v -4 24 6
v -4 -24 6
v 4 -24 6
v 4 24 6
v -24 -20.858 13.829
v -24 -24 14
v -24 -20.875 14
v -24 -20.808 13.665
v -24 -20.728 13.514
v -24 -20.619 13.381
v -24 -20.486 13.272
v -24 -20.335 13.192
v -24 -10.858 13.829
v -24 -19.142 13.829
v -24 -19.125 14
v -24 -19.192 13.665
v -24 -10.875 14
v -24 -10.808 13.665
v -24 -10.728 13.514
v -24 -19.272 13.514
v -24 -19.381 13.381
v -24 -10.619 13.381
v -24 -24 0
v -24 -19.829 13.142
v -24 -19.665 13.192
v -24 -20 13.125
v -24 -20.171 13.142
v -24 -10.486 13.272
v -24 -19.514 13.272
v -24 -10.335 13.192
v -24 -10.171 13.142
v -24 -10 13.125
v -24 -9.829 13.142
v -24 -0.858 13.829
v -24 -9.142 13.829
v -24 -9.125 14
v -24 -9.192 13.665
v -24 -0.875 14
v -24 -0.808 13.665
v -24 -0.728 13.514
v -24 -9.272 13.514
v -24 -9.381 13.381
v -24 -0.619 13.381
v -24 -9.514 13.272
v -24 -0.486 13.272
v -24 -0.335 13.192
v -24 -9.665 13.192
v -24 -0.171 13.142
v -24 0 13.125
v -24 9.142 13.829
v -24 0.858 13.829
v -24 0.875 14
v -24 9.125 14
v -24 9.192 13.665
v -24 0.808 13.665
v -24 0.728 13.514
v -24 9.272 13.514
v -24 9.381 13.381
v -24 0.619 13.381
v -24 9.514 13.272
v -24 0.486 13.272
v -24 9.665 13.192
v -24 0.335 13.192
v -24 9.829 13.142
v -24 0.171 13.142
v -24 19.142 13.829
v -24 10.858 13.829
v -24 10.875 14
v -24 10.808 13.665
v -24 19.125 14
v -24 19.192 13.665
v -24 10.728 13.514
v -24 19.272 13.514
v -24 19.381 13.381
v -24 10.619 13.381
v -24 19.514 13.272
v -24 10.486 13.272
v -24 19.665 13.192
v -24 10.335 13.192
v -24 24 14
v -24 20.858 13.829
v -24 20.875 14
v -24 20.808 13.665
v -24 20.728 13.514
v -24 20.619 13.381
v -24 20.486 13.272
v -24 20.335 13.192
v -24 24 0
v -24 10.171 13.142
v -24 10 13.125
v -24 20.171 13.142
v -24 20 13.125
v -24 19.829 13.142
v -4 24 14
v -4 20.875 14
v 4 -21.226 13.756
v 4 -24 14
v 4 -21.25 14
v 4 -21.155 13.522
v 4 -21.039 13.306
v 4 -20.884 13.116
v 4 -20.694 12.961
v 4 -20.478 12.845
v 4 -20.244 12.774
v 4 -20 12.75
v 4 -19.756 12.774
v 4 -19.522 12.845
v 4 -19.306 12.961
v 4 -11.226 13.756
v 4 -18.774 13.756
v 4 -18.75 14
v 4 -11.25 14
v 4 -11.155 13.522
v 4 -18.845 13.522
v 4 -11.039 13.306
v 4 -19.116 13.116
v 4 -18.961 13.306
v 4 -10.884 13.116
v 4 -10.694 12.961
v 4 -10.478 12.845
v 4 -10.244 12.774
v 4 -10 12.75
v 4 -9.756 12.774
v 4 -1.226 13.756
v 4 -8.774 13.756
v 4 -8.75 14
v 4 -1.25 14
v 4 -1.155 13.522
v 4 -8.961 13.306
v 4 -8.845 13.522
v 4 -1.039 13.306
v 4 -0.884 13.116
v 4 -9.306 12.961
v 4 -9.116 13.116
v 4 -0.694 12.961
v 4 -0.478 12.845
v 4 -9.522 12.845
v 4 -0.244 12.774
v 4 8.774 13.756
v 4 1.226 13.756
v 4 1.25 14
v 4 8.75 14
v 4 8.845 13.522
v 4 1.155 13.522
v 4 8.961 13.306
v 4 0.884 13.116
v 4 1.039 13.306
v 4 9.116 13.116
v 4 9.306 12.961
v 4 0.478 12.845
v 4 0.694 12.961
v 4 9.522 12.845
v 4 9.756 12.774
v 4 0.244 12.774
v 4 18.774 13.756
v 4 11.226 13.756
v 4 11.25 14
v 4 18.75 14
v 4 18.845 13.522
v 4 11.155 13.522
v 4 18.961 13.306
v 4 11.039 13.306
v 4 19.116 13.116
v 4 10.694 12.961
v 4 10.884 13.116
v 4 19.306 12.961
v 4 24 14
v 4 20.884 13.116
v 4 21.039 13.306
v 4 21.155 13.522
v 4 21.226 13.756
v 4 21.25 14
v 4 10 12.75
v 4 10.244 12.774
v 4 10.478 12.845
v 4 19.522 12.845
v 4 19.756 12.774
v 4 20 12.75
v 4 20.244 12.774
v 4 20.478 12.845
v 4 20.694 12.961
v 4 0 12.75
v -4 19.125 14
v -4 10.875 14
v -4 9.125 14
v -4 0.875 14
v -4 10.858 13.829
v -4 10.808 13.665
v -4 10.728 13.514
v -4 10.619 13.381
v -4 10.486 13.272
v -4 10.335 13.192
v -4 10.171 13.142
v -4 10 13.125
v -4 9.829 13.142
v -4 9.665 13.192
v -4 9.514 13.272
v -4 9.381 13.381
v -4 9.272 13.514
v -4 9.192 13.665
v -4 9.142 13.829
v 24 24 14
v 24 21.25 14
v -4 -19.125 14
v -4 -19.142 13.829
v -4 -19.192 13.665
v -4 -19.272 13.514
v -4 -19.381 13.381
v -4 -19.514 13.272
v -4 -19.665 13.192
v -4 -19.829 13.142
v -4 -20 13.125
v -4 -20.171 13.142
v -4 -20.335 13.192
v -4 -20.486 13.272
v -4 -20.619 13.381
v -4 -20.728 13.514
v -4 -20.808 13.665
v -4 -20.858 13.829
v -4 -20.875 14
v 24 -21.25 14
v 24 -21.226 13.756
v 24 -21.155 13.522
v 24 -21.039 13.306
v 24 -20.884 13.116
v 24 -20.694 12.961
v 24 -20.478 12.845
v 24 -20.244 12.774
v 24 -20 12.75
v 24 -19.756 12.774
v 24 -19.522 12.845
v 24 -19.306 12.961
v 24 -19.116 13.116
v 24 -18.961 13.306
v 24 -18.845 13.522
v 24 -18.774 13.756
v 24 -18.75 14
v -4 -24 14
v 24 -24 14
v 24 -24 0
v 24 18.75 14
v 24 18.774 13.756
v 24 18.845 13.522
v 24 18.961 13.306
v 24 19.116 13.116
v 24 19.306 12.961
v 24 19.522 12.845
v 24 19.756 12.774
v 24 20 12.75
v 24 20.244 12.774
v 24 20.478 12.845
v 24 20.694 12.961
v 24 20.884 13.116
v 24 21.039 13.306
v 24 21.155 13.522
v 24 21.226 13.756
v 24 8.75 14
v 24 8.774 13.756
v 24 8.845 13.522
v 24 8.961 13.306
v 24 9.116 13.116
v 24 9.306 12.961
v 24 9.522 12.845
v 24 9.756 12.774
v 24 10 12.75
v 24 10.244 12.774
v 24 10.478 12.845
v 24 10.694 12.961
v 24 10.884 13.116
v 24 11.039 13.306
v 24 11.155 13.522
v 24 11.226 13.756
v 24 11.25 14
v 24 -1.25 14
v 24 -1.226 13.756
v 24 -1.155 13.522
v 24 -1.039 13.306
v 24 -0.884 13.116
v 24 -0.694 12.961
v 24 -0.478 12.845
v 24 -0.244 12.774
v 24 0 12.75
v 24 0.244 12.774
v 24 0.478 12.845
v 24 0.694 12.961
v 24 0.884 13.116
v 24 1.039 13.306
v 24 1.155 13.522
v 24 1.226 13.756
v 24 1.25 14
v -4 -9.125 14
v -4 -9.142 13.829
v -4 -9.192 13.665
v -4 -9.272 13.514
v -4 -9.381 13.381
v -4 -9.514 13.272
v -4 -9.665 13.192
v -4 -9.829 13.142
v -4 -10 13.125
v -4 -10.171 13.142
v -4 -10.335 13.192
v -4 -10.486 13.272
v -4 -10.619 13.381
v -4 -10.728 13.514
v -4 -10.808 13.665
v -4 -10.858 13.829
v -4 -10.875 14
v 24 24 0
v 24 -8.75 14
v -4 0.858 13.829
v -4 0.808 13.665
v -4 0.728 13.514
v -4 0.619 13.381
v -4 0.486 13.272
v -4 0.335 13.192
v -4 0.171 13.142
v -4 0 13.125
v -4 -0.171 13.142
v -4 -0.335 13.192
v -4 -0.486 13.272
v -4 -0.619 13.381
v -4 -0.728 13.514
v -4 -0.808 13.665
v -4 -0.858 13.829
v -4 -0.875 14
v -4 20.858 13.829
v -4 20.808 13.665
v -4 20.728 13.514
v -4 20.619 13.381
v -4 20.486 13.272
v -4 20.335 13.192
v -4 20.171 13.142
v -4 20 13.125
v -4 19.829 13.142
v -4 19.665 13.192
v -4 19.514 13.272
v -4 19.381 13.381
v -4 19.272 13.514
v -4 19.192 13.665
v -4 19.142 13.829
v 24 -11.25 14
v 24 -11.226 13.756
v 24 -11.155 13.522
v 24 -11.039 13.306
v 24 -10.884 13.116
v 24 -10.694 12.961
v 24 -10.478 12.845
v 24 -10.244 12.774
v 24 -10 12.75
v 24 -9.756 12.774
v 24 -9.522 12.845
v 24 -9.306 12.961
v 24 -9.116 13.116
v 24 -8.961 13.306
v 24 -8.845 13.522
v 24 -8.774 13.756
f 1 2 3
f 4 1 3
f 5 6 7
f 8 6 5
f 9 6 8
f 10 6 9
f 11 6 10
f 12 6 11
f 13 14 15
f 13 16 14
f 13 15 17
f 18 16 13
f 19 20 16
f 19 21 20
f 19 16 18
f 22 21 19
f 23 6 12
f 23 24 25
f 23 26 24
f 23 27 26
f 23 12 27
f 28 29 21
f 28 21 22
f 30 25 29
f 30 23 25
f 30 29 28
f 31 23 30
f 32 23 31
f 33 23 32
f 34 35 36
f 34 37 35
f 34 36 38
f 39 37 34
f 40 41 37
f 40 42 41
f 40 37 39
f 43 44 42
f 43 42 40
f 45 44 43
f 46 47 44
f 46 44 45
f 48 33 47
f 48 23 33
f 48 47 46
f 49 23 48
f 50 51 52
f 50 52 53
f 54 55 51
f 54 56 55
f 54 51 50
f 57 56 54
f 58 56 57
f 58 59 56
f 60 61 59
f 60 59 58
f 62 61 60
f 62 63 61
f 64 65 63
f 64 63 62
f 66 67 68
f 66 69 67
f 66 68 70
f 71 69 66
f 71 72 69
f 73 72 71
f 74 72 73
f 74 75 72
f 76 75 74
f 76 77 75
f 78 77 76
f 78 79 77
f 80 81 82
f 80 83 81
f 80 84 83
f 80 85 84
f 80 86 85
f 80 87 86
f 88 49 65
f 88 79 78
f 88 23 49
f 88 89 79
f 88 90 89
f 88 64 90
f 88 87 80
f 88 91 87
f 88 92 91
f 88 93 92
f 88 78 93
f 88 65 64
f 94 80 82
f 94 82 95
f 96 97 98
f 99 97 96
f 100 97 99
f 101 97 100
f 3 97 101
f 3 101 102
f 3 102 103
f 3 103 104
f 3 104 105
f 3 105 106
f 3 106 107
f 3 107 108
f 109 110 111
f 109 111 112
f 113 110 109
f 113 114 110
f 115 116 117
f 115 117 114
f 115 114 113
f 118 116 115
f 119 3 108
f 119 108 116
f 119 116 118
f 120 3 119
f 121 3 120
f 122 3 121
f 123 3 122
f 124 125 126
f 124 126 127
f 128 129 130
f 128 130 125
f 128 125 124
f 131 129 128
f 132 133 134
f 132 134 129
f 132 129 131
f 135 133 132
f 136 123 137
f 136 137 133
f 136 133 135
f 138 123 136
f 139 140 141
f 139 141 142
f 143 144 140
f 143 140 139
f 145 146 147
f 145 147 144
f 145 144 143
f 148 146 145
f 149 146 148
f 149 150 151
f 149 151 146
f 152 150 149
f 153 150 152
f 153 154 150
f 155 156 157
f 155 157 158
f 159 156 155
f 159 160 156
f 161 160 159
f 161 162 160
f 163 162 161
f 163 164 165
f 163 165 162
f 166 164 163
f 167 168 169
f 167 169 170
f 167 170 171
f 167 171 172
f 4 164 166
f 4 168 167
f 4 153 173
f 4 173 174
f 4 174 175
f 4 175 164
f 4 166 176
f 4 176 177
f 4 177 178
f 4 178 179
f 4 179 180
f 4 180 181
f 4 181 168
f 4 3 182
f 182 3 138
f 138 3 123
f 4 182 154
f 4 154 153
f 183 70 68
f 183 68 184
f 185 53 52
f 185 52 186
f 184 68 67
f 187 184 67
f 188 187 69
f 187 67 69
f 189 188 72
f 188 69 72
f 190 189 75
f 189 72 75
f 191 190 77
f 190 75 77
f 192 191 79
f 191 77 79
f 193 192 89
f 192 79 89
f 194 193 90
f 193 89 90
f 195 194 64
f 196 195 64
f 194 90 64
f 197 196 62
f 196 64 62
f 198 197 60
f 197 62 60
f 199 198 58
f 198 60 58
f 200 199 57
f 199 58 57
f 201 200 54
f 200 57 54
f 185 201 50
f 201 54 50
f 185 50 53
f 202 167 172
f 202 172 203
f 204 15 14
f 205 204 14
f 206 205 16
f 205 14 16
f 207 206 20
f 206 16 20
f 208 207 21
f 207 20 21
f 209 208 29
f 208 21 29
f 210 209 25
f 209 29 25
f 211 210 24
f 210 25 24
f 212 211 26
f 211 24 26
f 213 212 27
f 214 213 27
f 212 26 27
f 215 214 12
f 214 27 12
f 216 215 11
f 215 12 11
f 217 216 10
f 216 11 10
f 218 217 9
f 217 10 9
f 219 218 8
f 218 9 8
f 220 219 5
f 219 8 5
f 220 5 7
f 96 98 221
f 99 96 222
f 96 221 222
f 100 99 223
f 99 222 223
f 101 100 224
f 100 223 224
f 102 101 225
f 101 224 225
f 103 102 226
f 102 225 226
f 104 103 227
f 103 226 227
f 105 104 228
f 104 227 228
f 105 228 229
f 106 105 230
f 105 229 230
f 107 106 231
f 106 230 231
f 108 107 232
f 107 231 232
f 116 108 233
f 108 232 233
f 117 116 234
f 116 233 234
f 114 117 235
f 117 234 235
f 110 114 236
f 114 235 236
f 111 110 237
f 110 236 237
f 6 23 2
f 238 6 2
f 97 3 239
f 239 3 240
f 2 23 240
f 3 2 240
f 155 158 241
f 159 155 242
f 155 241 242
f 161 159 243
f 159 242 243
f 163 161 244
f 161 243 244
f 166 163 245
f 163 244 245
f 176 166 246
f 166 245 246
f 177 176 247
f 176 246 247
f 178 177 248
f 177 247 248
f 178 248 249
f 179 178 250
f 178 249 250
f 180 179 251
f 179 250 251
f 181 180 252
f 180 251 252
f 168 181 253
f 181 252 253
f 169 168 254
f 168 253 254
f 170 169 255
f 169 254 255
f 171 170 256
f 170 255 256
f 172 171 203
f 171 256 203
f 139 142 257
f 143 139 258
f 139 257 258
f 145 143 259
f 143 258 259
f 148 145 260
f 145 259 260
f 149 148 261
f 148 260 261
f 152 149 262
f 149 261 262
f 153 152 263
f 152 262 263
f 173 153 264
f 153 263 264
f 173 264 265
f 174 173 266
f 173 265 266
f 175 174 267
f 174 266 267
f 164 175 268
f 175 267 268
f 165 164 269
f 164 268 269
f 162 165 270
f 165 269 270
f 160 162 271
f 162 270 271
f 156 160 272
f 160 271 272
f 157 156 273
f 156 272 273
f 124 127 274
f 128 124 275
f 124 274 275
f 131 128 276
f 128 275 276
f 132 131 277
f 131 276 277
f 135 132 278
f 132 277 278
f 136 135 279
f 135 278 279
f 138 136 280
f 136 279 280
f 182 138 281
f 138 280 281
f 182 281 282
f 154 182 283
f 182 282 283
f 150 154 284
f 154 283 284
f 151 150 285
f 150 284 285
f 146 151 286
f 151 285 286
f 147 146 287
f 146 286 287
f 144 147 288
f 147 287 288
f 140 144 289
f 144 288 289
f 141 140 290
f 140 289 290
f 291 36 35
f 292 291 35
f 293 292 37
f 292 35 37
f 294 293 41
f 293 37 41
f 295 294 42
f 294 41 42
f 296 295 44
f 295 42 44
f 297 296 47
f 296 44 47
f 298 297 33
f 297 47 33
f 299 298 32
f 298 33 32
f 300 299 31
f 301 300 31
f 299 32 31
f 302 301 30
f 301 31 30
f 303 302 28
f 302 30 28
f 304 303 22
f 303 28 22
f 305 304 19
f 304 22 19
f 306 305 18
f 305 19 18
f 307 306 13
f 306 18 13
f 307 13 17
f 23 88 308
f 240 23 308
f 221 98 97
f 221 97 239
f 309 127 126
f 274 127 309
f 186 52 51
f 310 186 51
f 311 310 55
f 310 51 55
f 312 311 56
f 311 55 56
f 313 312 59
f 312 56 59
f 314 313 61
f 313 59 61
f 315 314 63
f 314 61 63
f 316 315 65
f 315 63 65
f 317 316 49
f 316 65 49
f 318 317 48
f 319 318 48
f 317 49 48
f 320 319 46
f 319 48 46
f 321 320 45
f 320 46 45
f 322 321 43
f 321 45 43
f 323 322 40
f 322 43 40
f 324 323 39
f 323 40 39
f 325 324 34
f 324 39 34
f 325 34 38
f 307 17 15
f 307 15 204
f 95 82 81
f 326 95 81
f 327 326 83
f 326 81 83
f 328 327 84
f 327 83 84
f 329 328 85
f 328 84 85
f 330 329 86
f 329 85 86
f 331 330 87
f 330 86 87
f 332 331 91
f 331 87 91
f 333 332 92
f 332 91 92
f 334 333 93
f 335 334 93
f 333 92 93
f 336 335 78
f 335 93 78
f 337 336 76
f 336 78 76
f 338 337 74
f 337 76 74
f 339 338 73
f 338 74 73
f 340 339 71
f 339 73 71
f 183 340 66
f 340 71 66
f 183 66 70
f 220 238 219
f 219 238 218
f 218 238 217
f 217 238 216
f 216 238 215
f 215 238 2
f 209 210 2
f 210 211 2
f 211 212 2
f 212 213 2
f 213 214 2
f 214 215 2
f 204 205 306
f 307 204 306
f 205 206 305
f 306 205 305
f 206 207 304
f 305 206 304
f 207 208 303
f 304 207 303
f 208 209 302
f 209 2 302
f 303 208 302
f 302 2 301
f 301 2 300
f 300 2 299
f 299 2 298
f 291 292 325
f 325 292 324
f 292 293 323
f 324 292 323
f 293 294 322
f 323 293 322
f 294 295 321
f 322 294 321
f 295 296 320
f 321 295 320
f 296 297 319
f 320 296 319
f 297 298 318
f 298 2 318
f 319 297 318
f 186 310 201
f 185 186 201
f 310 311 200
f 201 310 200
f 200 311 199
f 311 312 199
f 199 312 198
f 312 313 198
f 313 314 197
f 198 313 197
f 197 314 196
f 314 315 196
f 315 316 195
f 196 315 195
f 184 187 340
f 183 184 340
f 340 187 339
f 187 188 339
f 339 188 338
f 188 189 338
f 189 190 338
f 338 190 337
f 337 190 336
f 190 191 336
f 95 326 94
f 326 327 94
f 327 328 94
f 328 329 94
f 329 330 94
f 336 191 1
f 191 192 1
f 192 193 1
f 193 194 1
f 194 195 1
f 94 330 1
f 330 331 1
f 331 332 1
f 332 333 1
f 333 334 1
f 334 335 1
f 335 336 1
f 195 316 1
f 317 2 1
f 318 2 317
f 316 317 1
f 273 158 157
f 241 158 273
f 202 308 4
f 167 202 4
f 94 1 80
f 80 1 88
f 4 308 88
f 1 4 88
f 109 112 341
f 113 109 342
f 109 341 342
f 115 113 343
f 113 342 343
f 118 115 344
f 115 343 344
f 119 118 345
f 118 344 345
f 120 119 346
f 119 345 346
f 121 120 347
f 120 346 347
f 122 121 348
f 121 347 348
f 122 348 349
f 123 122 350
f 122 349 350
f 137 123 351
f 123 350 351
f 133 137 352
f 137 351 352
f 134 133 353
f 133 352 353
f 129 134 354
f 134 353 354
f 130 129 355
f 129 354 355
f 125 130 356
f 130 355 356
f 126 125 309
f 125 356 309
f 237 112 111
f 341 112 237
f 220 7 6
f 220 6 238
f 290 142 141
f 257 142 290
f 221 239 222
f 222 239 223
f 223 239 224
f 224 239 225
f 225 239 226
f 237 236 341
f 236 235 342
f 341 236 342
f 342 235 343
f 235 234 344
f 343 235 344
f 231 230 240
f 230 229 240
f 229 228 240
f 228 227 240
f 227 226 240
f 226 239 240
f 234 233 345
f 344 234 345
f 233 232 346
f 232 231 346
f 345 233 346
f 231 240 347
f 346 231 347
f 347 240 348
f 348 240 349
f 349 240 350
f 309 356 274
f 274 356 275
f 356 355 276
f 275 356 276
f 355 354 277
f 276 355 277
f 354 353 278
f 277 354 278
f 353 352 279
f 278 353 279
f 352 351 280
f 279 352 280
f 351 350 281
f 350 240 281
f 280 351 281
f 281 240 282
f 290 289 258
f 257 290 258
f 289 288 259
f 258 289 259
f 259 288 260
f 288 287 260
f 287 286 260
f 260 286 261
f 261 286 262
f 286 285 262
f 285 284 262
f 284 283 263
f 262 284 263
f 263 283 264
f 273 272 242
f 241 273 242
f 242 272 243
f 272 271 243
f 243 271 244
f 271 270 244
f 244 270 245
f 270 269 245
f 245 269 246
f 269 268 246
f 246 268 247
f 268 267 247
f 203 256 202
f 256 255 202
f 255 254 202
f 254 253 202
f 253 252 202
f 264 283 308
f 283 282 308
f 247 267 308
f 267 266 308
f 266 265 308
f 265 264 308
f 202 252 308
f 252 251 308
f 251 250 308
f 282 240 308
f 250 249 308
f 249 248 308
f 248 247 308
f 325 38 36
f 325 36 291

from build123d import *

# Parameters (mm, degrees)
SKETCH1_W           = 48
SKETCH1_H           = 48
BOSS_EXTRUDE1_DEPTH = 6
SKETCH1_3_W         = 20
SKETCH1_3_H         = 48
BOSS_EXTRUDE2_DEPTH = 14
SKETCH2_R           = 0.875
CUT_EXTRUDE1_DEPTH  = 25
SKETCH3_R           = 1.25
CUT_EXTRUDE2_DEPTH  = 25


with BuildPart() as part:
    # Sketch1 → Boss-Extrude1 (new body)
    with BuildSketch(Plane.XY):
        Rectangle(SKETCH1_W, SKETCH1_H)
    extrude(amount=BOSS_EXTRUDE1_DEPTH)

    # Sketch1<3> → Boss-Extrude2 (add)
    with BuildSketch(Plane.XY):
        with Locations((-14, 0)):
            Rectangle(SKETCH1_3_W, SKETCH1_3_H)
        with Locations((14, 0)):
            Rectangle(SKETCH1_3_W, SKETCH1_3_H)
    extrude(amount=BOSS_EXTRUDE2_DEPTH)

    # Sketch2 → Cut-Extrude1 (cut)
    with BuildSketch(Plane.ZY.offset(24)):
        with Locations((14, 0)):
            Circle(SKETCH2_R)
        with Locations((14, 10)):
            Circle(SKETCH2_R)
        with Locations((14, 20)):
            Circle(SKETCH2_R)
        with Locations((14, -10)):
            Circle(SKETCH2_R)
        with Locations((14, -20)):
            Circle(SKETCH2_R)
    extrude(amount=-CUT_EXTRUDE1_DEPTH, mode=Mode.SUBTRACT)

    # Sketch3 → Cut-Extrude2 (cut)
    with BuildSketch(Plane(origin=(24, 0, 0), x_dir=(0, 0, -1), z_dir=(1, 0, 0))):
        with Locations((-14, 0)):
            Circle(SKETCH3_R)
        with Locations((-14, -10)):
            Circle(SKETCH3_R)
        with Locations((-14, -20)):
            Circle(SKETCH3_R)
        with Locations((-14, 10)):
            Circle(SKETCH3_R)
        with Locations((-14, 20)):
            Circle(SKETCH3_R)
    extrude(amount=-CUT_EXTRUDE2_DEPTH, mode=Mode.SUBTRACT)


solid = part.part
